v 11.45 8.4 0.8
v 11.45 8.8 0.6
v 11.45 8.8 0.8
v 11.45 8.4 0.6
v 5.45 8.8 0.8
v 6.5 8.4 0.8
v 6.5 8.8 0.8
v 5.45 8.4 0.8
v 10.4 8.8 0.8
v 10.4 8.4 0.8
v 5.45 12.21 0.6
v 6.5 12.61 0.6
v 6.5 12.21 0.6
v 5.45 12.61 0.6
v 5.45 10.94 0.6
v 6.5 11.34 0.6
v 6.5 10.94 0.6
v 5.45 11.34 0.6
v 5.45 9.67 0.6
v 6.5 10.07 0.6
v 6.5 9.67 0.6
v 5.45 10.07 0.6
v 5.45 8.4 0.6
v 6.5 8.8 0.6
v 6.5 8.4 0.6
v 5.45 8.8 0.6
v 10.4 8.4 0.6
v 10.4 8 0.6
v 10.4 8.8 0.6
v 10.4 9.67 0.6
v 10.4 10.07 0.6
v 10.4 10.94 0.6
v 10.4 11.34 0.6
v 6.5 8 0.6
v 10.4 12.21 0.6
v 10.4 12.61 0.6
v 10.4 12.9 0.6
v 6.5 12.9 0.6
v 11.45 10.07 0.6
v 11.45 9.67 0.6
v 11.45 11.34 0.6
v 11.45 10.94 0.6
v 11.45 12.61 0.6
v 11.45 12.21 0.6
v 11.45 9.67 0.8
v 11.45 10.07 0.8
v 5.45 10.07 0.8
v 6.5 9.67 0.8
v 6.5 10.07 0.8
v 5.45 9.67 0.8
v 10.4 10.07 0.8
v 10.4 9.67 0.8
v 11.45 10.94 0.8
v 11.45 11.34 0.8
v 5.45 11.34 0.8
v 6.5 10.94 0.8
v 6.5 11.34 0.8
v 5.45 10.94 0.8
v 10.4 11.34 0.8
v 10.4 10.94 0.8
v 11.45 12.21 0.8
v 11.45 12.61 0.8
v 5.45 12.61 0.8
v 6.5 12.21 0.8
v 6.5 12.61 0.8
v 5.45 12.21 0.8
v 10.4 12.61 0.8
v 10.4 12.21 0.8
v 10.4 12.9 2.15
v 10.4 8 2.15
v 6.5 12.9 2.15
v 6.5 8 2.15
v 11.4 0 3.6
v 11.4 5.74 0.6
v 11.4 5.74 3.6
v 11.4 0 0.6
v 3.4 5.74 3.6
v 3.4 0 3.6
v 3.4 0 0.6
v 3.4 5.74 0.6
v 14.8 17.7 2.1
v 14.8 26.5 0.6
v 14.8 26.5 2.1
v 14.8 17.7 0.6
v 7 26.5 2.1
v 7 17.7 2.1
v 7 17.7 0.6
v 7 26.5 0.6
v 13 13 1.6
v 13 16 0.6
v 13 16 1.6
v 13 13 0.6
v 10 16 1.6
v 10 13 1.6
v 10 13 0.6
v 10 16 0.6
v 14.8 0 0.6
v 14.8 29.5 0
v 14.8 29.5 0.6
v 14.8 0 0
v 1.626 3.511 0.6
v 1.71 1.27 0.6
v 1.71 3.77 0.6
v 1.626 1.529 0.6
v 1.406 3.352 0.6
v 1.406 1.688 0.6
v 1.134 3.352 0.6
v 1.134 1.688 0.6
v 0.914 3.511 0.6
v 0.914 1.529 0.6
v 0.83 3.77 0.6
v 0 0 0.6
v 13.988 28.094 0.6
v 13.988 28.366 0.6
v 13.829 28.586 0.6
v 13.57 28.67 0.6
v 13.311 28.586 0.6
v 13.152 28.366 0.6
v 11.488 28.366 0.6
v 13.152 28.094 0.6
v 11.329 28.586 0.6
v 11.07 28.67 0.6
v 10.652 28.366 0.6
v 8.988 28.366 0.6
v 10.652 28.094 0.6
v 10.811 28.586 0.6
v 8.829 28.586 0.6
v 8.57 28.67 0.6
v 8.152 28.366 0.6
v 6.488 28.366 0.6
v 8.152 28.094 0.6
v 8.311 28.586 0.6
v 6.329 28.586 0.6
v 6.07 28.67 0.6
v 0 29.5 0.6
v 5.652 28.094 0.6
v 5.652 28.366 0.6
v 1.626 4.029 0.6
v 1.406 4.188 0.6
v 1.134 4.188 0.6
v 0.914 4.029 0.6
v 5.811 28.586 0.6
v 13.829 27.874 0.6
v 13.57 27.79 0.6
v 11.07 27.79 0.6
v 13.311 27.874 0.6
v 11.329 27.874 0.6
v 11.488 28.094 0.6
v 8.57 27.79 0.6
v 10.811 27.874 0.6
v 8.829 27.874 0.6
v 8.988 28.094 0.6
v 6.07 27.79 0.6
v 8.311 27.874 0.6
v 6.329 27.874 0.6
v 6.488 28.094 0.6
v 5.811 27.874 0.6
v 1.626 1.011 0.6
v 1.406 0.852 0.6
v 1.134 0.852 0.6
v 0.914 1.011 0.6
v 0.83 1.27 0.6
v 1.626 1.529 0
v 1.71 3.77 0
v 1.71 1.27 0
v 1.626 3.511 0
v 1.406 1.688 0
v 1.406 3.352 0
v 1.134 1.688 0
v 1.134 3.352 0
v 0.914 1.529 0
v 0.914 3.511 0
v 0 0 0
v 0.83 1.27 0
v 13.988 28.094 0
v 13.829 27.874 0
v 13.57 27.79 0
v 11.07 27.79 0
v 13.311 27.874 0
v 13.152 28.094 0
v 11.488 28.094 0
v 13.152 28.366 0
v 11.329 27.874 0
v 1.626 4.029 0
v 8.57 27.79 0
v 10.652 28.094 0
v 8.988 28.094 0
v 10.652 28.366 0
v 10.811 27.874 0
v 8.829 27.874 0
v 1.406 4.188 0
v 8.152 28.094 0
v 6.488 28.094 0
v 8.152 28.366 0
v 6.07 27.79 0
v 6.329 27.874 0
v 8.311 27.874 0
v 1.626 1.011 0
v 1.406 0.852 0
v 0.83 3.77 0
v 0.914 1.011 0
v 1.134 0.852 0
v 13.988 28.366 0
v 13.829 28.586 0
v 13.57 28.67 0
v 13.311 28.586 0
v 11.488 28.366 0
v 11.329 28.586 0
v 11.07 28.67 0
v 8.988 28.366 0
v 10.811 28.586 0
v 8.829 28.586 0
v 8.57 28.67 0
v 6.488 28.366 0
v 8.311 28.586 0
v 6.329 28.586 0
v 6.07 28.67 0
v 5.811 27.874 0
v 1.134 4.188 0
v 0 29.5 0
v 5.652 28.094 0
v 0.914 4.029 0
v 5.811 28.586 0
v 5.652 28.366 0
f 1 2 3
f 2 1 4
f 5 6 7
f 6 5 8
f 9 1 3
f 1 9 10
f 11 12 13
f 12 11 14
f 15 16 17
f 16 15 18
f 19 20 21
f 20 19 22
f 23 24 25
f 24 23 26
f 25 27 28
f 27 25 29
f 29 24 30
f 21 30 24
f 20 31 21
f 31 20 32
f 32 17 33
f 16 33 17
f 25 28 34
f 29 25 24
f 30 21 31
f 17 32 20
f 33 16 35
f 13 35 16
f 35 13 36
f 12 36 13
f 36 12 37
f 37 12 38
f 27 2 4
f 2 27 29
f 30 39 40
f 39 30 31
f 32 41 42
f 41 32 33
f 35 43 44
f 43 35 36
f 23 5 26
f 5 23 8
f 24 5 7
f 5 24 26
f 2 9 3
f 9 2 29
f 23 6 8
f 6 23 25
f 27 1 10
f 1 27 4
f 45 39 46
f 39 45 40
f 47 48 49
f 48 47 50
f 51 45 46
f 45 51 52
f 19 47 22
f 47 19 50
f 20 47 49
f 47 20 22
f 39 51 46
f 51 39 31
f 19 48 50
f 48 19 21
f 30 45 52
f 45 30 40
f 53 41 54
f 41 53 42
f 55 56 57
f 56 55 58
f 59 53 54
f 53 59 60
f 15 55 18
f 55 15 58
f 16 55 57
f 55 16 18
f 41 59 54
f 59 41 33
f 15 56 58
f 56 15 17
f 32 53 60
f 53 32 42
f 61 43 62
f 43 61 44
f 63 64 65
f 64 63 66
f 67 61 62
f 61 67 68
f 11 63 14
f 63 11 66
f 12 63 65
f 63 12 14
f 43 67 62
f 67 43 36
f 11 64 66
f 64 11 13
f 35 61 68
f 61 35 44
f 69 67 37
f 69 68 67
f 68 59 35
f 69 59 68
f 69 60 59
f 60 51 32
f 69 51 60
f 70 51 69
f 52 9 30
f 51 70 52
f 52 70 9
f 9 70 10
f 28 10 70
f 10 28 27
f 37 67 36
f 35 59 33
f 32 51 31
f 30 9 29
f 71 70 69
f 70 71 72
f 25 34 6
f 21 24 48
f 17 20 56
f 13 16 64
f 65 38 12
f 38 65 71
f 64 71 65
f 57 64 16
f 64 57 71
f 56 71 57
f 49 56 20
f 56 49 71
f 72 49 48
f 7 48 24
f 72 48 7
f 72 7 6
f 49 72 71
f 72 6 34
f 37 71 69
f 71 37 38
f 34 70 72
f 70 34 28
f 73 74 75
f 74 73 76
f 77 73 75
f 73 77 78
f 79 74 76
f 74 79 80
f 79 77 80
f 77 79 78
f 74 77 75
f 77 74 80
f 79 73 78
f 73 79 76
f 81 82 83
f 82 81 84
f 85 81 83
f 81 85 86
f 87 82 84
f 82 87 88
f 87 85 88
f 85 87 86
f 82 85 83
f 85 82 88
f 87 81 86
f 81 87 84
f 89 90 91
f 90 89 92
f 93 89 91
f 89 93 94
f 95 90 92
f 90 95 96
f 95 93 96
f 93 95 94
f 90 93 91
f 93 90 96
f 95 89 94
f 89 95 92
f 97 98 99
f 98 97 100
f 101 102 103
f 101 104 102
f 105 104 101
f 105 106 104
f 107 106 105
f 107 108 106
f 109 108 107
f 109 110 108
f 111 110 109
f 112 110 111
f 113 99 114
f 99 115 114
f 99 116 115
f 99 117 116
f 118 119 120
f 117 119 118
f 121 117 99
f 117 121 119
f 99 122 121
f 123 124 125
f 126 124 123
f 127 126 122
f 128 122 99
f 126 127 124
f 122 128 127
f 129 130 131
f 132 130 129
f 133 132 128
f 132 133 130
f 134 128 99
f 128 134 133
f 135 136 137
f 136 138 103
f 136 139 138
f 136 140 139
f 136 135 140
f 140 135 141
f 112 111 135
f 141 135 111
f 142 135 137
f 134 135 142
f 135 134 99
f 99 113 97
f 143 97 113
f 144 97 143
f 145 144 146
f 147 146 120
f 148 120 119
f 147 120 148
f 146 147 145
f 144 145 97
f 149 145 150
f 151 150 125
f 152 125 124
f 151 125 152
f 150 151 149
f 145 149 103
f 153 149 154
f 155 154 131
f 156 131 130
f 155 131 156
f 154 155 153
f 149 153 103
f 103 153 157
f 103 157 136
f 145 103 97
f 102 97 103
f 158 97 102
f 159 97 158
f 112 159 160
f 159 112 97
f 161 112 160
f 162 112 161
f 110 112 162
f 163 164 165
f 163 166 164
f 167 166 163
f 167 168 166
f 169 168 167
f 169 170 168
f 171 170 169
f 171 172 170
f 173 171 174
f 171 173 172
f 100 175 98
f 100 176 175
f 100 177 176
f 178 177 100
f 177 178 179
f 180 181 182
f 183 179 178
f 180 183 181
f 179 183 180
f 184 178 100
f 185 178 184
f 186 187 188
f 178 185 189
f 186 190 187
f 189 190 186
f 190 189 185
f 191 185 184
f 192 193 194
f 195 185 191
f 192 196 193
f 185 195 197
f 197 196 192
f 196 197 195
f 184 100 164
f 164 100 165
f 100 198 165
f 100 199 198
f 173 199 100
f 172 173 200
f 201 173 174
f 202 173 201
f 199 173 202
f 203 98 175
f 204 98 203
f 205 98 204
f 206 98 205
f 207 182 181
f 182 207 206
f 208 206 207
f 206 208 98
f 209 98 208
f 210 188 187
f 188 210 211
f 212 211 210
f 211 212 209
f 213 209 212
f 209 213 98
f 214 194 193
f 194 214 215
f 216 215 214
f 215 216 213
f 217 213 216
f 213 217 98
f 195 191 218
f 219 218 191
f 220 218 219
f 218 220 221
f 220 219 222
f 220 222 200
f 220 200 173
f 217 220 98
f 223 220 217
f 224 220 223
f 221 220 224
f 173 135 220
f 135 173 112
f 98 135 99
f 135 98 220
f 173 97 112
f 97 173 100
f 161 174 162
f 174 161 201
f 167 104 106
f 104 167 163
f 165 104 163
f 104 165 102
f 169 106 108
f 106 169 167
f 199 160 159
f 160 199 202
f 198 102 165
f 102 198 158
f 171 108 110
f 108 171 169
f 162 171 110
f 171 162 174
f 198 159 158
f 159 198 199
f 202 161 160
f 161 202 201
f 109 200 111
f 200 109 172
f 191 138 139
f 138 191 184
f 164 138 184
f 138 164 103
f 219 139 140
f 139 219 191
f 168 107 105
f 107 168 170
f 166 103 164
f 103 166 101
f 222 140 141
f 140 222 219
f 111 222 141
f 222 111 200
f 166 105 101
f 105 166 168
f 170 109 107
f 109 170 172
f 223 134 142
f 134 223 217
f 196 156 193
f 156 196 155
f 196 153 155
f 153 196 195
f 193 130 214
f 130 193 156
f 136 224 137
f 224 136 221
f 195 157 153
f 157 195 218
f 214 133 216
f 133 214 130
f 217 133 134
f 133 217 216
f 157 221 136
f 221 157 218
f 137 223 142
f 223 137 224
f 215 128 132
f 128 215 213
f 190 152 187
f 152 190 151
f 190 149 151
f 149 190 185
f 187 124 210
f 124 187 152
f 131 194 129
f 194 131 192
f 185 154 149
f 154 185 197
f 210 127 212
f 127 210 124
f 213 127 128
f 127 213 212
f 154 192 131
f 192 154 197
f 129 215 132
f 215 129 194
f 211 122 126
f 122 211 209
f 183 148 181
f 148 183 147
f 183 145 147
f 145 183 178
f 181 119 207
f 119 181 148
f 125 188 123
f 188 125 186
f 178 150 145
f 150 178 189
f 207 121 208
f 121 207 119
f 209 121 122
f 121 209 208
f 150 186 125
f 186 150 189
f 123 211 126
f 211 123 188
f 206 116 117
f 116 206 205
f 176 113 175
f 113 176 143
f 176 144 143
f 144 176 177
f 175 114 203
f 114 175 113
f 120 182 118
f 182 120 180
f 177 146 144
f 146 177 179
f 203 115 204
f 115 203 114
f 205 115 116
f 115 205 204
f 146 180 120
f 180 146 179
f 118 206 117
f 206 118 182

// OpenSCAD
// file: components/SMD_Components.scad
//_0804();
//_0603();
//_0402();




module _0804(x, y, z, centering) {
    translate([x, y, z])
    cube([2.0, 1.0, 1.0],centering);
}

module _0603(x, y, z, centering) {
    translate([x, y, z])
    cube([1.6, 0.8, 0.8],centering);
}

module _0402(x, y, z, centering) {
    translate([x, y, z])
    cube([1.0, 0.5, 0.5],centering);
}

module _0201(x, y, z, centering) {
    translate([x, y, z])
    cube([0.6, 0.3, 0.3],centering);
}
// file: components/female_header.scad
hole_diameter = 0.88;
hole_spacing = 2.5;
//female_header_4(1,1,1);


module female_header_1(x, y, z, centering) {
    translate([x, y, z]) {
        translate([1.27,1.27,0])
        cylinder(h = 10, r = hole_diameter / 2, center = true, $fn=10);
    }
}


module female_header_2(x, y, z, centering) {
    translate([x, y, z]) {
        translate([1.27,1.27,0])
            cylinder(h = 10, r = hole_diameter / 2, center = true, $fn=10);
        translate([1.27, 1 * hole_spacing + 1.27,0])
            cylinder(h = 10, r = hole_diameter / 2, center = true, $fn=10);
    }
}


module female_header_3(x, y, z, centering) {
    translate([x, y, z]) {
        translate([1.27,1.27,0])
            cylinder(h = 10, r = hole_diameter / 2, center = true, $fn=10);
        translate([1.27, 1 * hole_spacing + 1.27,0])
            cylinder(h = 10, r = hole_diameter / 2, center = true, $fn=10);
        translate([1.27, 2 * hole_spacing + 1.27,0])
            cylinder(h = 10, r = hole_diameter / 2, center = true, $fn=10);
    }
}


module female_header_4(x, y, z, centering) {
    translate([x, y, z]) {
        translate([1.27,1.27,0])
            cylinder(h = 10, r = hole_diameter / 2, center = true, $fn=10);
        translate([1.27, 1 * hole_spacing + 1.27,0])
            cylinder(h = 10, r = hole_diameter / 2, center = true, $fn=10);
        translate([1.27, 2 * hole_spacing + 1.27,0])
            cylinder(h = 10, r = hole_diameter / 2, center = true, $fn=10);
        translate([1.27, 3 * hole_spacing + 1.27,0])
            cylinder(h = 10, r = hole_diameter / 2, center = true, $fn=10);
    }
}

module female_header_7(x, y, z, centering) {
    translate([x, y, z]) {
        translate([1.27,1.27,0])
            cylinder(h = 10, r = hole_diameter / 2, center = true, $fn=10);
        translate([1.27, 1 * hole_spacing + 1.27,0])
            cylinder(h = 10, r = hole_diameter / 2, center = true, $fn=10);
        translate([1.27, 2 * hole_spacing + 1.27,0])
            cylinder(h = 10, r = hole_diameter / 2, center = true, $fn=10);
        translate([1.27, 3 * hole_spacing + 1.27,0])
            cylinder(h = 10, r = hole_diameter / 2, center = true, $fn=10);
        translate([1.27, 4 * hole_spacing + 1.27,0])
            cylinder(h = 10, r = hole_diameter / 2, center = true, $fn=10);
        translate([1.27, 5 * hole_spacing + 1.27,0])
            cylinder(h = 10, r = hole_diameter / 2, center = true, $fn=10);
        translate([1.27, 6 * hole_spacing + 1.27,0])
            cylinder(h = 10, r = hole_diameter / 2, center = true, $fn=10);
    }
}
// file: components/TP4056.scad
//https://datasheet.lcsc.com/szlcsc/Nanjing-Extension-Microelectronics-TP4056_C16581.pdf

TP4056_x = 3.9;
TP4056_y = 4.9;
TP4056_z = 1.55;

TP4056_pin_x = 6;
TP4056_pin_y = 0.4;
TP4056_pin_z = 0.2;
TP4056_pin_spacing = 1.27;
TP4056_pin_offset = 0.4;

//TP4056();

module TP4056(x, y, z, centering) {
    translate([x, y, z]) {
        if(centering) {
            total_x = TP4056_x;
            total_y = TP4056_y;
            total_z = TP4056_z;
            translate([ -total_x / 2, -total_y / 2, -total_z / 2])
            TP4056_component();
        } else {
            TP4056_component();
        }
    }
}


module TP4056_component() {
    union() {
        //pins
        translate([0, 0 * TP4056_pin_spacing + TP4056_pin_offset, 0])
        cube([TP4056_pin_x, TP4056_pin_y, TP4056_pin_z]);
        translate([0, 1 * TP4056_pin_spacing + TP4056_pin_offset, 0])
        cube([TP4056_pin_x, TP4056_pin_y, TP4056_pin_z]);
        translate([0, 2 * TP4056_pin_spacing + TP4056_pin_offset, 0])
        cube([TP4056_pin_x, TP4056_pin_y, TP4056_pin_z]);
        translate([0, 3 * TP4056_pin_spacing + TP4056_pin_offset, 0])
        cube([TP4056_pin_x, TP4056_pin_y, TP4056_pin_z]);
        //base
        translate([(TP4056_pin_x - TP4056_x) / 2, 0, 0])
        cube([TP4056_x, TP4056_y, TP4056_z]);
    }
}
// file: components/3_3V_Regulator.scad
//https://datasheet.lcsc.com/szlcsc/Texas-Instruments-TI-TPS76933DBVR-PB-FREE_C7101.pdf
reg_x = 1.6;
reg_y = 2.9;
reg_z = 1.45;

reg_pin_x = 2.8;
reg_pin_y = 0.4;
reg_pin_z = 0.1;
reg_pin_spacing = 0.8;
reg_pin_offset = (reg_y - 3 * reg_pin_y) / 4;

//3_3V_Regulator();

module 3_3V_Regulator(x, y, z, centering) {
    translate([x, y, z]) {
        if(centering) {
        total_x = reg_pin_x;
        total_y = reg_y;
        total_z = reg_z + reg_pin_z;
        translate([-total_x/2, -total_y/2, -total_z/2])
        3_3V_Regulator_Component();
        } else {
            3_3V_Regulator_Component();
        }
    }
}

module 3_3V_Regulator_Component() {
    union() {
        //base
        translate([reg_pin_x / 2 - reg_x / 2, 0, reg_pin_z])
        cube([reg_x, reg_y, reg_z]);
        //pins
        translate([0, 0 * reg_pin_spacing + reg_pin_offset, 0])
        cube([reg_pin_x, reg_pin_y, reg_pin_z]);
        translate([0, 1 * reg_pin_spacing + reg_pin_offset, 0])
        cube([reg_pin_x, reg_pin_y, reg_pin_z]);
        translate([0, 2 * reg_pin_spacing + reg_pin_offset, 0])
        cube([reg_pin_x, reg_pin_y, reg_pin_z]);
    }
}
// file: components/mpu9250.scad
//http://www.invensense.com/wp-content/uploads/2015/02/PS-MPU-9250A-01-v1.1.pdf

mpu9250_x = 3;
mpu9250_y = 3;
mpu9250_z = 1;

//mpu9250();

module mpu9250(x, y, z, centering) {
    translate([x, y, z])
    cube([mpu9250_x, mpu9250_y, mpu9250_z], centering);
}
// file: components/microUSB.scad
//https://datasheet.lcsc.com/szlcsc/Jing-Extension-of-the-Electronic-Co-LCSC-MICRO-USB-5S-B-Type-horns-High-temperature_C10418.pdf
microUSB_x = 8;
microUSB_y = 5.74;
microUSB_z = 3;


//microUSB();

module microUSB(x, y, z, centering) {
    translate([x, y, z])
    cube([microUSB_x, microUSB_y, microUSB_z], centering);
}
// file: components/K3-2235S-K1.scad
//https://datasheet.lcsc.com/szlcsc/Korean-Hroparts-Elec-K3-2235S-K1_C145845.pdf

switch_base_x = 3.5;
switch_base_y = 9.1;
switch_base_z = 3.5;

switch_toggle_x = 1.5;
switch_toggle_y = 1.5;
switch_toggle_z = 2;
switch_toggle_travel = 2;

switch_pin_x = 6.9;
switch_pin_y = 0.6;
switch_pin_z = 0.3;
switch_pin_spacing = 2.5;
switch_pin_offset = (switch_base_y - 3 * switch_pin_y) / 4;

//switch();


module switch(x, y, z, centering) {
    translate([x, y, z]) {
        if(centering) {
            total_x = switch_pin_x;
            total_y = switch_base_y;
            total_z = switch_base_z + switch_toggle_z + switch_pin_z;
            translate([ -total_x / 2, -total_y / 2, -total_z / 2])
            switch_component();
        } else {
            switch_component();
        }
    }
}



module switch_component() {
    union() {
        //base
        translate([switch_pin_x / 2 - switch_base_x / 2, 0, switch_pin_z])
        cube([switch_base_x, switch_base_y, switch_base_z]);
        //pins
        translate([0, 0 * switch_pin_spacing + switch_pin_offset, 0])
        cube([switch_pin_x, switch_pin_y, switch_pin_z]);
        translate([0, 1 * switch_pin_spacing + switch_pin_offset, 0])
        cube([switch_pin_x, switch_pin_y, switch_pin_z]);
        translate([0, 2 * switch_pin_spacing + switch_pin_offset, 0])
        cube([switch_pin_x, switch_pin_y, switch_pin_z]);
        //toggle
        translate([(switch_pin_x - switch_toggle_x) / 2, (switch_base_y - (switch_toggle_y + switch_toggle_travel)) / 2, switch_pin_z + switch_base_z])
        cube([switch_toggle_x, switch_toggle_y + switch_toggle_travel, switch_toggle_z]);
    }
}
// file: components/BC832.scad
//https://www.mouser.com/datasheet/2/915/BlueNor_BC832_datasheets-1360471.pdf
BC832_x = 7.8;
BC832_y = 8.8;
BC832_z = 1.5;

//BC832(0,0,0);

module BC832(x, y, z, centering) {
    translate([x, y, z])
    cube([BC832_x,BC832_y,BC832_z], centering);
}
// main file
include <components/BC832.scad>
include <components/K3-2235S-K1.scad>
include <components/microUSB.scad>
include <components/mpu9250.scad>
include <components/3_3V_Regulator.scad>
include <components/TP4056.scad>
include <components/female_header.scad>
include <components/SMD_Components.scad>
//include <components/ADP150.scad>
//include <components/DST1610A.scad>

detail = 30; // decrease to speed up rendering

PCB_x = 14.8;
PCB_y = 29.5;
PCB_z = 0.6;

//mpu9250();
//BC832();
//switch();

//microUSB();
//shelf();

difference() {
    union() {
        PCB();
        translate([0,0,PCB_z]) {
            translate([PCB_x / 2 - microUSB_x / 2, 0, 0])
            microUSB();
            translate([PCB_x / 2 - TP4056_x / 2, 8, 0])
            TP4056();
            translate([PCB_x - BC832_x, PCB_y - BC832_y - 3, 0])
            BC832();
            translate([10, 13, 0])
            mpu9250();
        }
    }
    female_header_2();
    translate([PCB_x - hole_spacing * 4, PCB_y, 0])
    rotate([0, 0, 270])
    female_header_4();
}



module PCB(centering) {
    cube([PCB_x, PCB_y, PCB_z], centering);
}

module header() {
    cylinder(h = 100, r = 0.45, center = true, $fn=100);
}
